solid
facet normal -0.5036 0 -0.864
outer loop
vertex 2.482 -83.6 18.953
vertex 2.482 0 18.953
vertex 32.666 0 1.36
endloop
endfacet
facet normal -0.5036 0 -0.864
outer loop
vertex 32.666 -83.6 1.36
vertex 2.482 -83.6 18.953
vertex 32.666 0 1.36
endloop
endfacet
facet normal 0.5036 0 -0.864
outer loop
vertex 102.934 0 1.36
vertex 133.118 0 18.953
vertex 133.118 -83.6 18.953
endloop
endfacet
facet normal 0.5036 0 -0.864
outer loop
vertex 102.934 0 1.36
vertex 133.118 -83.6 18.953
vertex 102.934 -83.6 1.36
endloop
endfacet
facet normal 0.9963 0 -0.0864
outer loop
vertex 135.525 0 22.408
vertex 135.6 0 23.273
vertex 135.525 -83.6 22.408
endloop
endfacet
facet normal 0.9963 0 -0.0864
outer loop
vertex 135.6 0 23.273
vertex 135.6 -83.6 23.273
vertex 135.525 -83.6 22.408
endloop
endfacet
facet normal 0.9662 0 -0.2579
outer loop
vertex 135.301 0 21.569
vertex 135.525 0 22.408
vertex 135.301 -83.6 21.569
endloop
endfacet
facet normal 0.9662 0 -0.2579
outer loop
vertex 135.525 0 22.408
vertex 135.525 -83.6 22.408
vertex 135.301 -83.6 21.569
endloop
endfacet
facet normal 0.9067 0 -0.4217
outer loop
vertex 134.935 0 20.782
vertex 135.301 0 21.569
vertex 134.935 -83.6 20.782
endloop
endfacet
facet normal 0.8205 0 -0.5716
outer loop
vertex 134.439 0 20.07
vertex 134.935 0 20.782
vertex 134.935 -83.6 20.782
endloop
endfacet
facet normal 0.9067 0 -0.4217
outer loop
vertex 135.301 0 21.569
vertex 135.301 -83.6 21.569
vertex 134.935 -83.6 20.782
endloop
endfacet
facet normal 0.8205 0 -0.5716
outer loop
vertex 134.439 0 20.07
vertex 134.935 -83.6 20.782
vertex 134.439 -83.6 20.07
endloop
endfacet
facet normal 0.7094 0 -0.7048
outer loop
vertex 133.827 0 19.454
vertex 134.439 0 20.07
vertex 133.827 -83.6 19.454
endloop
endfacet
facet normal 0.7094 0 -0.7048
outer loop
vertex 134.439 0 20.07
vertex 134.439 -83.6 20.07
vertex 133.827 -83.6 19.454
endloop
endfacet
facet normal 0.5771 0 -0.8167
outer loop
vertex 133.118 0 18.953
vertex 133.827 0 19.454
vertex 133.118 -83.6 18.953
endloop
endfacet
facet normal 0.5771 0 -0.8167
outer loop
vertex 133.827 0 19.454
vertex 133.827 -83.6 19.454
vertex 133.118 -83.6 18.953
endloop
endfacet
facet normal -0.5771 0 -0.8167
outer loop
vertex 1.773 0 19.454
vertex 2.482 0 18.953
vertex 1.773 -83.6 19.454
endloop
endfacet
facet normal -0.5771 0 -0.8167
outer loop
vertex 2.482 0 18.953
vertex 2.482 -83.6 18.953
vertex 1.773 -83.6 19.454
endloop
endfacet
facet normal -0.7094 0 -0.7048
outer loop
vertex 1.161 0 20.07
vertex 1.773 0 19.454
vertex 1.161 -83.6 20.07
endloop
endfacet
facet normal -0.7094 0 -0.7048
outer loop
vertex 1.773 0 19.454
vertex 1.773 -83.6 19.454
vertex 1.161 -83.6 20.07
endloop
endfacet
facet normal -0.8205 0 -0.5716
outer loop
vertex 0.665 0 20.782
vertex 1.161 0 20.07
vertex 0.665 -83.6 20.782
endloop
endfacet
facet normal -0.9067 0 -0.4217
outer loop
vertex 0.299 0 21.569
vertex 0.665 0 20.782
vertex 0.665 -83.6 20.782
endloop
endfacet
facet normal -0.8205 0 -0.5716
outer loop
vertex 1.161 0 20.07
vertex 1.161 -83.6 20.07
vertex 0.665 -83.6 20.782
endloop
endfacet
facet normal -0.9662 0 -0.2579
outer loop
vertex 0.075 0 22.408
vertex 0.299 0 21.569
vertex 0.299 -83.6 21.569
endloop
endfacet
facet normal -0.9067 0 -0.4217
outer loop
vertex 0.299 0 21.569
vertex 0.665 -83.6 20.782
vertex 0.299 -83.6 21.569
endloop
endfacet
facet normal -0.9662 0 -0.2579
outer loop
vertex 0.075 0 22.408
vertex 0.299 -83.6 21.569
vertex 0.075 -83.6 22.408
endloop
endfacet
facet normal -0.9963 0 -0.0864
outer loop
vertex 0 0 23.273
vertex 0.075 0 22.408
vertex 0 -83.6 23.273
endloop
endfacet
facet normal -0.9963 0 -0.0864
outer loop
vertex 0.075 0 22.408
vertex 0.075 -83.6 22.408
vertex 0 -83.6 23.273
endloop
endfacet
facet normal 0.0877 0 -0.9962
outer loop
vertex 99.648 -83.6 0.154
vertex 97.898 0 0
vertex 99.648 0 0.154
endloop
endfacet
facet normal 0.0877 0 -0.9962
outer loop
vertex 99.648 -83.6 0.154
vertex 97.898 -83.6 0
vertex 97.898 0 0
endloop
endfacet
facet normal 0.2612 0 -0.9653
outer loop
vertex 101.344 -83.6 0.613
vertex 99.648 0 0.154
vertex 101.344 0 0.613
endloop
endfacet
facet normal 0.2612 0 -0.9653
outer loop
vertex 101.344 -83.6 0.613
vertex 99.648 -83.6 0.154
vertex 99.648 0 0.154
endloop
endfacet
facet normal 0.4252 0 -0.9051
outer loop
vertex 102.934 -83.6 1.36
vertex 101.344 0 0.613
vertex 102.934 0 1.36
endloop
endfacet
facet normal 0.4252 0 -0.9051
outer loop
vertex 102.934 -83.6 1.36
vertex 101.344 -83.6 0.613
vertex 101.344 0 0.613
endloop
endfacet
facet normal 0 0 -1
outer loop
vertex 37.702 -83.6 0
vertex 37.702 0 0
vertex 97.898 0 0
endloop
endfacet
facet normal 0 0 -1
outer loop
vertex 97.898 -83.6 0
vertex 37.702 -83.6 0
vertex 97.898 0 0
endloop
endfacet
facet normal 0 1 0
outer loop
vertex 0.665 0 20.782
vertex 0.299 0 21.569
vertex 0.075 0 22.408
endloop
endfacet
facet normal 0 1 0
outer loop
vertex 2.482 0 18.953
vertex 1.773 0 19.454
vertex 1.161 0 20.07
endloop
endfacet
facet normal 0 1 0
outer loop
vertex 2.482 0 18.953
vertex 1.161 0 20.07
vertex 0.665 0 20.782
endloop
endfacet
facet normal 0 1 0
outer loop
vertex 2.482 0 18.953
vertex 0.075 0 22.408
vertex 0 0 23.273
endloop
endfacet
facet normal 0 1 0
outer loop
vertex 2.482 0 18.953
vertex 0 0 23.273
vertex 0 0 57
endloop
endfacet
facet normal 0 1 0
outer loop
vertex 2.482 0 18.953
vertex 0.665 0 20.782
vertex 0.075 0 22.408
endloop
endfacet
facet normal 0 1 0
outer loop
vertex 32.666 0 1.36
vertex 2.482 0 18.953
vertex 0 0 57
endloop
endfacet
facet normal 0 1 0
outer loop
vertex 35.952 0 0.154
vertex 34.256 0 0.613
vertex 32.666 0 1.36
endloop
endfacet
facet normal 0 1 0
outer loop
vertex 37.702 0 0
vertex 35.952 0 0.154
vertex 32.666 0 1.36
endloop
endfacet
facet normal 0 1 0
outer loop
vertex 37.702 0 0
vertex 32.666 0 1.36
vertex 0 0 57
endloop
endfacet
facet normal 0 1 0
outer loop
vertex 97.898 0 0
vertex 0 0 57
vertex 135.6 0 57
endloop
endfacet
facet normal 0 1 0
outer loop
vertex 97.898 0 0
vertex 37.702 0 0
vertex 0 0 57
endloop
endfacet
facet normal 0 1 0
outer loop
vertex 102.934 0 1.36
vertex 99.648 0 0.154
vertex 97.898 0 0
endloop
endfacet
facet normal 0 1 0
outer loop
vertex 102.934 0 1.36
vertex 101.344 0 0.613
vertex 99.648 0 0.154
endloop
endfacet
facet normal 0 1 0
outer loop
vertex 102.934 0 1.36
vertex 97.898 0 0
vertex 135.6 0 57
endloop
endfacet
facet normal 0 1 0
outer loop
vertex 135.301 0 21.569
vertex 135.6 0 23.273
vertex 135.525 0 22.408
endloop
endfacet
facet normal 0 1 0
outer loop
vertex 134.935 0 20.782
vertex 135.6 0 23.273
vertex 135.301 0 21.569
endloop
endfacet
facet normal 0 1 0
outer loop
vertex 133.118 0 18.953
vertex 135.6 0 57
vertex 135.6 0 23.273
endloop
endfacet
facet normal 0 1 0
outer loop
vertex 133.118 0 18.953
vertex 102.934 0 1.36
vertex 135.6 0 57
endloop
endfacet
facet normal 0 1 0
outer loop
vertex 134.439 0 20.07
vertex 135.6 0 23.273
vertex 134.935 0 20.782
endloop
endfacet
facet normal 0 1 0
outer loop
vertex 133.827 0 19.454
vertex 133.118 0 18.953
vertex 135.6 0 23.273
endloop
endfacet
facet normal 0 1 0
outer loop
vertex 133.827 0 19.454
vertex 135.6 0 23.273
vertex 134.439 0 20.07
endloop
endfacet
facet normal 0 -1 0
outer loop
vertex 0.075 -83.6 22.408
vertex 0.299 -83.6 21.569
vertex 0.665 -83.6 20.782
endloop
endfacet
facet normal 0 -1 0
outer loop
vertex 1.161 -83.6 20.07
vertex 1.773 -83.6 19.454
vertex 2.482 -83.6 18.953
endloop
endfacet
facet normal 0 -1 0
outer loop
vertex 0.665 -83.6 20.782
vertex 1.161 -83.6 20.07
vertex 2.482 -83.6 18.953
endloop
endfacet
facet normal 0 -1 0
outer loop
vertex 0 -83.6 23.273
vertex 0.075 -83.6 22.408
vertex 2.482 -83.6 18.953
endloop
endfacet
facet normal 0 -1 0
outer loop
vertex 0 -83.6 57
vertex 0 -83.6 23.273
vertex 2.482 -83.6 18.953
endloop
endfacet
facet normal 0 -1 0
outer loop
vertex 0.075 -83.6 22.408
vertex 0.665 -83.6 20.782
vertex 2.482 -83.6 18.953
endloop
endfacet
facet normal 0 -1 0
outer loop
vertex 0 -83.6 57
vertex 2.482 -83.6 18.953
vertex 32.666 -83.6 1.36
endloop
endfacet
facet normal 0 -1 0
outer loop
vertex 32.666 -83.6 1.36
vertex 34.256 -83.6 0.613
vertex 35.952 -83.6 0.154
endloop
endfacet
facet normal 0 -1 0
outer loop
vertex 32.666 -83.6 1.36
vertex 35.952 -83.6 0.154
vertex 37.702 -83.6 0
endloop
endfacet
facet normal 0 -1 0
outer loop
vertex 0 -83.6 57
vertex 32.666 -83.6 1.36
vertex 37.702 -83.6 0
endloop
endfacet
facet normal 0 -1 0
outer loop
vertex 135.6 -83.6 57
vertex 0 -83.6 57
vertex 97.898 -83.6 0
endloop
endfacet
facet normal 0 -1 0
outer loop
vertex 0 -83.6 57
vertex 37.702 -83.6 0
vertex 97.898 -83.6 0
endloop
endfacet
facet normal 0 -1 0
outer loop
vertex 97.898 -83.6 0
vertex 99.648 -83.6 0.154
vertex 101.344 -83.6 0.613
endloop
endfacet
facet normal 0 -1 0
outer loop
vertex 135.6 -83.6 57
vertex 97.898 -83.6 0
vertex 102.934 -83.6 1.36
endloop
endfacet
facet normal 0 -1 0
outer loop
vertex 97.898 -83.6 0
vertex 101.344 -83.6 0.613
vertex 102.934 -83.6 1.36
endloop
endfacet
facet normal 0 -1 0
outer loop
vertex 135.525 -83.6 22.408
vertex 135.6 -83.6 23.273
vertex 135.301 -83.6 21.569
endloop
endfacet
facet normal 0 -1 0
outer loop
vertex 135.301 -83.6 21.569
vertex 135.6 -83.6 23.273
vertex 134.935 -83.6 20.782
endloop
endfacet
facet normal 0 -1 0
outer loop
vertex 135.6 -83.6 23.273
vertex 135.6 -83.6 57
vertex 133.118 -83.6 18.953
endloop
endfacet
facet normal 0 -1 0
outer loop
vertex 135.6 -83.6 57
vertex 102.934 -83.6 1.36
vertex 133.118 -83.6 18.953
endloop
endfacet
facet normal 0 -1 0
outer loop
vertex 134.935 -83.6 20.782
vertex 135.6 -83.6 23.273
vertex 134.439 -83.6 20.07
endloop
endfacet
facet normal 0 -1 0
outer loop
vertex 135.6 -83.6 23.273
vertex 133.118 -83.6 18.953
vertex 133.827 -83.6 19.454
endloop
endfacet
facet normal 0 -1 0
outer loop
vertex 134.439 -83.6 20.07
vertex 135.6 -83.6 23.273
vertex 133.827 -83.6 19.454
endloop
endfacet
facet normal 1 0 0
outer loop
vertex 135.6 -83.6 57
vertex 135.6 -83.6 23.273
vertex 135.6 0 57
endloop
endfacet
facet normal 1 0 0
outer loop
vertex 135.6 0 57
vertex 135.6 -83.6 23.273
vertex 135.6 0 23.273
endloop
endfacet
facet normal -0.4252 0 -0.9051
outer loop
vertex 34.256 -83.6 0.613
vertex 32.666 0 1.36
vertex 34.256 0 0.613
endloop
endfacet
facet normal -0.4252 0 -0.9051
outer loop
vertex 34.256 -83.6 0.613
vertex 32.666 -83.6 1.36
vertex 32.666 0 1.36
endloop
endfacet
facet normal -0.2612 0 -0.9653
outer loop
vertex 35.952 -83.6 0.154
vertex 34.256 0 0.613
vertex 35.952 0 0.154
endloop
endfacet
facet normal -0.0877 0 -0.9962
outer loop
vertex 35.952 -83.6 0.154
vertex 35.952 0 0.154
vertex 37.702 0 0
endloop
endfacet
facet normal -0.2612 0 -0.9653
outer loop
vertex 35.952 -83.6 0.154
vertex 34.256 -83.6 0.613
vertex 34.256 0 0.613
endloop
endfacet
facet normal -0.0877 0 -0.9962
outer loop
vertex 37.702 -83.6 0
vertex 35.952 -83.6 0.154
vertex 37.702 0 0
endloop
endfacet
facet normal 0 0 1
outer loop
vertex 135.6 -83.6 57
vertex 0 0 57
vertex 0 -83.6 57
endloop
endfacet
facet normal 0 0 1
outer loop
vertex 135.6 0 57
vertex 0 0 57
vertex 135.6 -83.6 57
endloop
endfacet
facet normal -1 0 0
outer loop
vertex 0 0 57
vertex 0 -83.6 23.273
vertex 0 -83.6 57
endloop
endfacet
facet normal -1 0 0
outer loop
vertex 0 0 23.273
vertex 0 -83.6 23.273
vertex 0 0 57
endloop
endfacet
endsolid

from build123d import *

# Parameters (mm, degrees)
SKETCH1_W           = 135.6
SKETCH1_H           = 83.6
BOSS_EXTRUDE1_DEPTH = 57
CUT_EXTRUDE2_DEPTH  = 84.6
FILLET2_R           = 10
FILLET3_R           = 5


with BuildPart() as part:
    # Sketch1 → Boss-Extrude1 (new body)
    with BuildSketch(Plane.XY):
        with Locations((67.8, -41.8)):
            Rectangle(SKETCH1_W, SKETCH1_H)
    extrude(amount=BOSS_EXTRUDE1_DEPTH)

    # Sketch3 → Cut-Extrude2 (cut, through all)
    with BuildSketch(Plane(origin=(0, 0, 0), x_dir=(1, 0, 0), z_dir=(0, 1, 0))):
        Polygon((100.6, 0), (135.6, 0), (135.6, -20.4), align=None)
        Polygon((35, 0), (0, 0), (0, -20.4), align=None)
    extrude(amount=-CUT_EXTRUDE2_DEPTH, mode=Mode.SUBTRACT)

    # Fillet2
    fillet2_edges = [part.edges().sort_by_distance(p)[0] for p in [
        (100.6, -41.8, 0),
        (35, -41.8, 0),
    ]]
    fillet(fillet2_edges, radius=FILLET2_R)

    # Fillet3
    fillet3_edges = [part.edges().sort_by_distance(p)[0] for p in [
        (135.6, -41.8, 20.4),
        (0, -41.8, 20.4),
    ]]
    fillet(fillet3_edges, radius=FILLET3_R)


solid = part.part
